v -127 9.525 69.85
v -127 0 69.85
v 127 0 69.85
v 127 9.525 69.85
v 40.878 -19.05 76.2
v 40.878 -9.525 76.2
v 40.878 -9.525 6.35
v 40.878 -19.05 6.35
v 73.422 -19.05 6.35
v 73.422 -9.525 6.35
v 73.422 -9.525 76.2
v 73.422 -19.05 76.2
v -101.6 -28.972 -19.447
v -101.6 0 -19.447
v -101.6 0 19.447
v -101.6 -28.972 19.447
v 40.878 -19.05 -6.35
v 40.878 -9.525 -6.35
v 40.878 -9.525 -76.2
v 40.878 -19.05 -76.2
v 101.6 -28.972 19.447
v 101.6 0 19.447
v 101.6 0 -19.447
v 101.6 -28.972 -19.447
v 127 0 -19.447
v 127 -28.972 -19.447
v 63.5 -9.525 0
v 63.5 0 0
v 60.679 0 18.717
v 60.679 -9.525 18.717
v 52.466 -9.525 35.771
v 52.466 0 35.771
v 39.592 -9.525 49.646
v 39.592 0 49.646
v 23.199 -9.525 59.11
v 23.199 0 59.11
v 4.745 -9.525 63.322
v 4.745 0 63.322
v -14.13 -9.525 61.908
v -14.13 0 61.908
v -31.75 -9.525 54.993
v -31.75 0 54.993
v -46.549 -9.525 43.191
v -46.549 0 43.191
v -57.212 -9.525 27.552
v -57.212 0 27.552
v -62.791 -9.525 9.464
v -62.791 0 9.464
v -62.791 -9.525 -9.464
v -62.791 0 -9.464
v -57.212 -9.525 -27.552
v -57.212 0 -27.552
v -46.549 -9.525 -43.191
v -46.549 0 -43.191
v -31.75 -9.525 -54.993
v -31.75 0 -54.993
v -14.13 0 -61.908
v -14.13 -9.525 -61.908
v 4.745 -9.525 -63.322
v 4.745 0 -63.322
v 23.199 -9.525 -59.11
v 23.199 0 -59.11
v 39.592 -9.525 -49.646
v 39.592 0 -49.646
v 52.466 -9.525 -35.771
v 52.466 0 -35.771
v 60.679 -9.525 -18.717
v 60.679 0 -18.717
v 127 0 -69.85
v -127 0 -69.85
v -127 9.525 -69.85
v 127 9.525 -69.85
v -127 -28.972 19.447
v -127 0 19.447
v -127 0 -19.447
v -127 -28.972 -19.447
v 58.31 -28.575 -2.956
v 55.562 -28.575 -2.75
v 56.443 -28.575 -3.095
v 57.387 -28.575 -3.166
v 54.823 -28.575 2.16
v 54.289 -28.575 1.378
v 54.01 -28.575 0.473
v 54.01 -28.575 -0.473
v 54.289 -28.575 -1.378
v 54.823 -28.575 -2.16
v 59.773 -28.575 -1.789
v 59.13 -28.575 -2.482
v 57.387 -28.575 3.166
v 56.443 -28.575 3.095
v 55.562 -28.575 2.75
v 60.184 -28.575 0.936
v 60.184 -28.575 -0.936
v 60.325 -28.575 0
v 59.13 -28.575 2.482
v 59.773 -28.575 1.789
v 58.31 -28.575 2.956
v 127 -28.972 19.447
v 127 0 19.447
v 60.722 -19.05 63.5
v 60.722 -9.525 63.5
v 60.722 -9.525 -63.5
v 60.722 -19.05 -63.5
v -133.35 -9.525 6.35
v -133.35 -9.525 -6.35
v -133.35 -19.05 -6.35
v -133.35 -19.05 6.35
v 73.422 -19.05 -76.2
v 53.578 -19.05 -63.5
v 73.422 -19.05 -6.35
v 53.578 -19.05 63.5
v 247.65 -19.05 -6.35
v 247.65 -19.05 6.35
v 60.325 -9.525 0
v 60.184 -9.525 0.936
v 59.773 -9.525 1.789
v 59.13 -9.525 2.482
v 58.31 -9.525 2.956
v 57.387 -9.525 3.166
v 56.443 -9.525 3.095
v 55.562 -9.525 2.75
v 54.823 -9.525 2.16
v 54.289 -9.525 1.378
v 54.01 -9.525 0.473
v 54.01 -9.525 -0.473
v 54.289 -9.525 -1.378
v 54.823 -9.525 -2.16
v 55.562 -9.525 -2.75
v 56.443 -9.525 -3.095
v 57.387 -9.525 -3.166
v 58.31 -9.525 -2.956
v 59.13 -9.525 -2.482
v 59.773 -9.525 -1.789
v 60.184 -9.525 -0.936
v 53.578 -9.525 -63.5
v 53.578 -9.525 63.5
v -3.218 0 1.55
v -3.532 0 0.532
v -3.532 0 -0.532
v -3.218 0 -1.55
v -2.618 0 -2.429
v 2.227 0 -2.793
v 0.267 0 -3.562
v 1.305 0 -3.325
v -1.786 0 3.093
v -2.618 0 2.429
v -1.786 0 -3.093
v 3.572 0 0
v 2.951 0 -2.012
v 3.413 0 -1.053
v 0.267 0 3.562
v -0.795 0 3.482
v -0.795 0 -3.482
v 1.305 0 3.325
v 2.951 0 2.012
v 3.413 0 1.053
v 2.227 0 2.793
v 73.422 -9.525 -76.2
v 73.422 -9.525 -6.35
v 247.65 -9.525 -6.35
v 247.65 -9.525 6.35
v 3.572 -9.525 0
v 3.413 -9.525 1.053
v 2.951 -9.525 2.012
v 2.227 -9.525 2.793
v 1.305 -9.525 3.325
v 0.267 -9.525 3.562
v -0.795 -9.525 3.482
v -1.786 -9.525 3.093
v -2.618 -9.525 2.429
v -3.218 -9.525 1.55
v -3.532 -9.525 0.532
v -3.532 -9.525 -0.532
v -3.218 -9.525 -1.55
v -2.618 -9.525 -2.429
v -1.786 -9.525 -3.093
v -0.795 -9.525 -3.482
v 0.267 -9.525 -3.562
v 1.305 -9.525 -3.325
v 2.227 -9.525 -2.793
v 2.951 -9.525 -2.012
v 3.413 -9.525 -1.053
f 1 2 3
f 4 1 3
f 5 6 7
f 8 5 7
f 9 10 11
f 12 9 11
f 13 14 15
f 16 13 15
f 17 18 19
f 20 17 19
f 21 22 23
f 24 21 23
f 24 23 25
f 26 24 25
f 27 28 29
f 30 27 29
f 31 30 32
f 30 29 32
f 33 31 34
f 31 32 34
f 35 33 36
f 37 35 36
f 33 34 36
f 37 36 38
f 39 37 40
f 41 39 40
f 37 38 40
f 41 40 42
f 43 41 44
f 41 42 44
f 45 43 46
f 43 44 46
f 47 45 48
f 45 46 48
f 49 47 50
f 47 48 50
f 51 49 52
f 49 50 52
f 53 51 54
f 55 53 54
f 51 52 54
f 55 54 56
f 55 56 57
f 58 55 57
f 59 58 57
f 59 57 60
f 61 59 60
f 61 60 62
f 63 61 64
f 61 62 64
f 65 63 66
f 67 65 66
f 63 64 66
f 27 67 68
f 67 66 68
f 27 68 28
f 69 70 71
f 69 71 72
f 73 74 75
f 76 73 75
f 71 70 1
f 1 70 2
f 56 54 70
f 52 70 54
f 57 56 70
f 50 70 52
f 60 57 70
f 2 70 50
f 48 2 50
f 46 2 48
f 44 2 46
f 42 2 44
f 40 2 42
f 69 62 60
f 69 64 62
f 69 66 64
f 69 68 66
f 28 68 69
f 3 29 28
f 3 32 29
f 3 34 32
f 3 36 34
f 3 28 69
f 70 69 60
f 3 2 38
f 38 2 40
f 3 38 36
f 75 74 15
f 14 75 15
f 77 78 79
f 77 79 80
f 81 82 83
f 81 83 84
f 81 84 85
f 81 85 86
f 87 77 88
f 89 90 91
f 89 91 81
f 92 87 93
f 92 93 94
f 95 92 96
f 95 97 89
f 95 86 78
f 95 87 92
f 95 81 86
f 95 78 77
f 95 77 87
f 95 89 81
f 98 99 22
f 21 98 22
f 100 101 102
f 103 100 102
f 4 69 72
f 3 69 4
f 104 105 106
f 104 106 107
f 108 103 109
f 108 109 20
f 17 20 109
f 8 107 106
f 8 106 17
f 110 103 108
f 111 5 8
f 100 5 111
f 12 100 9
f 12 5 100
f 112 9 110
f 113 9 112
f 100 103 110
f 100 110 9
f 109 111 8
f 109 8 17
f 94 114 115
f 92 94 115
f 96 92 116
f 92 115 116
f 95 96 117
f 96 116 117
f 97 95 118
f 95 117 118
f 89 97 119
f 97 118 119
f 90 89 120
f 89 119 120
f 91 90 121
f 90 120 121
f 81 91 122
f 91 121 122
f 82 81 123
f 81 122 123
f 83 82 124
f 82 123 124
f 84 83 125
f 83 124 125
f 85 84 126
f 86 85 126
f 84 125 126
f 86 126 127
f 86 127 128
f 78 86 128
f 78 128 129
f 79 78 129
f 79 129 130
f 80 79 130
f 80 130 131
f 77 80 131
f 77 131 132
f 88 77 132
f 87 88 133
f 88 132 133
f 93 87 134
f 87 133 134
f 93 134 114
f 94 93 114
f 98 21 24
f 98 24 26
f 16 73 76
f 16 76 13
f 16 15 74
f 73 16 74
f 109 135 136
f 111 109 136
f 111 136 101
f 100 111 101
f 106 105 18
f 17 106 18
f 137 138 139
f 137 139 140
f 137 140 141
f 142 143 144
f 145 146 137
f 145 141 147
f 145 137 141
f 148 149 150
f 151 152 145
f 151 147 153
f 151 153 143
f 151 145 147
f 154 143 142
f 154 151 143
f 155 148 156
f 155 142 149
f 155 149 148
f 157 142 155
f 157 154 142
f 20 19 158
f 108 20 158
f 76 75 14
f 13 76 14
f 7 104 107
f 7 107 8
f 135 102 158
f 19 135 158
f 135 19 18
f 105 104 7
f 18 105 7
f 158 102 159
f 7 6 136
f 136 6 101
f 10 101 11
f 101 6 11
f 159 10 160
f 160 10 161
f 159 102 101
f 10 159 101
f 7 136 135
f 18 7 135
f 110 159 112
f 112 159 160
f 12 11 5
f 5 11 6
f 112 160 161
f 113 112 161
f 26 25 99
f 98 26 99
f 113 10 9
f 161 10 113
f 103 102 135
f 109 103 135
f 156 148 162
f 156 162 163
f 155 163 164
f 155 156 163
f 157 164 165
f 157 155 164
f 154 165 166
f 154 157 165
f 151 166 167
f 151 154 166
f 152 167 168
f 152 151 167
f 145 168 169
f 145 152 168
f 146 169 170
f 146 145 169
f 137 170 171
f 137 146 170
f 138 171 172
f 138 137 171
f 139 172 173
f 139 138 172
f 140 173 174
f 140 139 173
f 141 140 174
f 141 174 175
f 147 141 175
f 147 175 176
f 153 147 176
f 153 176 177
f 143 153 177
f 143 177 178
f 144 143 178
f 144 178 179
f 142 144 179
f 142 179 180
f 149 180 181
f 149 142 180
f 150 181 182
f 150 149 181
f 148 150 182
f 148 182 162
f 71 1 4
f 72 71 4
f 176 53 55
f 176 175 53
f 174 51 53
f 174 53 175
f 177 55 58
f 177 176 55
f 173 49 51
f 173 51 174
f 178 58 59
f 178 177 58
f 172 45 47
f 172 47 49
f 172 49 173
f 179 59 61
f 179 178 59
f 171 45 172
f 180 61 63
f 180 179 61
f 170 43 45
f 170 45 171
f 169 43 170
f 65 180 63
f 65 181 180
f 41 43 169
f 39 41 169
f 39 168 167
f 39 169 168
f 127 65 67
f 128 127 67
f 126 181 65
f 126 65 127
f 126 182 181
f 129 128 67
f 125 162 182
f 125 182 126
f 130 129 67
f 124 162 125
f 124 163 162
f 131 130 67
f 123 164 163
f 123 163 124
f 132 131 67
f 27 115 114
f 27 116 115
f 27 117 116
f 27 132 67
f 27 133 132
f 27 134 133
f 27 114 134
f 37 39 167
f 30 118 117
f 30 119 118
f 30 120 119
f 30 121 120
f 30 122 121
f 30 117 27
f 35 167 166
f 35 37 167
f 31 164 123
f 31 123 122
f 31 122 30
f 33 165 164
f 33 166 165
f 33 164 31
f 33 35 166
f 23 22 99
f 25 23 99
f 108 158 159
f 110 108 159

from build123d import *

# Parameters (mm, degrees)
F2_R      = 63.5
F2_R_2    = 3.571875
F3_DEPTH  = 9.525
F4_R      = 3.175
F5_DEPTH  = 19.05
F6_W      = 12.7
F6_H      = 12.7
F6_W_2    = 174.228125
F7_DEPTH  = 9.525
F8_W      = 254
F8_H      = 139.7
F9_DEPTH  = 9.525
F11_DEPTH = 28.971875


# Not quite as in the source:
# - a length typed as a fraction of an inch, garbled in the dataset ("3 / 203.2 mm" for 3/8 in), is restored


with BuildPart() as f3:
    # F2 (on Front) → F3 (new body)
    with BuildSketch(Plane.XZ):
        Circle(F2_R)
        Circle(F2_R_2, mode=Mode.SUBTRACT)
    extrude(amount=F3_DEPTH)

    # F4 (on face) → F5 (join)
    with BuildSketch(Plane.XZ.offset(9.525)):
        with Locations((57.15, 0)):
            Circle(F4_R)
    extrude(amount=F5_DEPTH)

    # F8 (on Front) → F9 (join)
    with BuildSketch(Plane.XZ):
        Rectangle(F8_W, F8_H)
    extrude(amount=-F9_DEPTH)


with BuildPart() as f7:
    # F6 (on face) → F7 (new body)
    with BuildSketch(Plane.XZ.offset(9.525)):
        Polygon((53.578125, 63.5), (60.721875, 63.5), (60.721875, 6.35), (73.421875, 6.35), (73.421875, 76.2), (40.878125, 76.2), (40.878125, 6.35), (53.578125, 6.35), align=None)
        with Locations((67.071875, 0)):
            Rectangle(F6_W, F6_H)
        with Locations((47.228125, 0)):
            Rectangle(F6_W, F6_H)
        Polygon((73.421875, -6.35), (60.721875, -6.35), (60.721875, -63.5), (53.578125, -63.5), (53.578125, -6.35), (40.878125, -6.35), (40.878125, -76.2), (73.421875, -76.2), align=None)
        with Locations((160.5359375, 0)):
            Rectangle(F6_W_2, F6_H)
        with Locations((-46.2359375, 0)):
            Rectangle(F6_W_2, F6_H)
    extrude(amount=F7_DEPTH)


with BuildPart() as f11:
    # F10 (on face) → F11 (new body)
    with BuildSketch(Plane.XZ):
        Polygon((-127, 19.446875), (-127, 0), (-127, -19.446875), (-101.6, -19.446875), (-101.6, 19.446875), align=None)
    extrude(amount=F11_DEPTH)


with BuildPart() as f11b:
    # F10 (on face) → F11, piece 2 (new body)
    with BuildSketch(Plane.XZ):
        Polygon((127, 0), (127, 19.446875), (101.6, 19.446875), (101.6, -19.446875), (127, -19.446875), align=None)
    extrude(amount=F11_DEPTH)


solid = Compound([f3.part, f7.part, f11.part, f11b.part])
